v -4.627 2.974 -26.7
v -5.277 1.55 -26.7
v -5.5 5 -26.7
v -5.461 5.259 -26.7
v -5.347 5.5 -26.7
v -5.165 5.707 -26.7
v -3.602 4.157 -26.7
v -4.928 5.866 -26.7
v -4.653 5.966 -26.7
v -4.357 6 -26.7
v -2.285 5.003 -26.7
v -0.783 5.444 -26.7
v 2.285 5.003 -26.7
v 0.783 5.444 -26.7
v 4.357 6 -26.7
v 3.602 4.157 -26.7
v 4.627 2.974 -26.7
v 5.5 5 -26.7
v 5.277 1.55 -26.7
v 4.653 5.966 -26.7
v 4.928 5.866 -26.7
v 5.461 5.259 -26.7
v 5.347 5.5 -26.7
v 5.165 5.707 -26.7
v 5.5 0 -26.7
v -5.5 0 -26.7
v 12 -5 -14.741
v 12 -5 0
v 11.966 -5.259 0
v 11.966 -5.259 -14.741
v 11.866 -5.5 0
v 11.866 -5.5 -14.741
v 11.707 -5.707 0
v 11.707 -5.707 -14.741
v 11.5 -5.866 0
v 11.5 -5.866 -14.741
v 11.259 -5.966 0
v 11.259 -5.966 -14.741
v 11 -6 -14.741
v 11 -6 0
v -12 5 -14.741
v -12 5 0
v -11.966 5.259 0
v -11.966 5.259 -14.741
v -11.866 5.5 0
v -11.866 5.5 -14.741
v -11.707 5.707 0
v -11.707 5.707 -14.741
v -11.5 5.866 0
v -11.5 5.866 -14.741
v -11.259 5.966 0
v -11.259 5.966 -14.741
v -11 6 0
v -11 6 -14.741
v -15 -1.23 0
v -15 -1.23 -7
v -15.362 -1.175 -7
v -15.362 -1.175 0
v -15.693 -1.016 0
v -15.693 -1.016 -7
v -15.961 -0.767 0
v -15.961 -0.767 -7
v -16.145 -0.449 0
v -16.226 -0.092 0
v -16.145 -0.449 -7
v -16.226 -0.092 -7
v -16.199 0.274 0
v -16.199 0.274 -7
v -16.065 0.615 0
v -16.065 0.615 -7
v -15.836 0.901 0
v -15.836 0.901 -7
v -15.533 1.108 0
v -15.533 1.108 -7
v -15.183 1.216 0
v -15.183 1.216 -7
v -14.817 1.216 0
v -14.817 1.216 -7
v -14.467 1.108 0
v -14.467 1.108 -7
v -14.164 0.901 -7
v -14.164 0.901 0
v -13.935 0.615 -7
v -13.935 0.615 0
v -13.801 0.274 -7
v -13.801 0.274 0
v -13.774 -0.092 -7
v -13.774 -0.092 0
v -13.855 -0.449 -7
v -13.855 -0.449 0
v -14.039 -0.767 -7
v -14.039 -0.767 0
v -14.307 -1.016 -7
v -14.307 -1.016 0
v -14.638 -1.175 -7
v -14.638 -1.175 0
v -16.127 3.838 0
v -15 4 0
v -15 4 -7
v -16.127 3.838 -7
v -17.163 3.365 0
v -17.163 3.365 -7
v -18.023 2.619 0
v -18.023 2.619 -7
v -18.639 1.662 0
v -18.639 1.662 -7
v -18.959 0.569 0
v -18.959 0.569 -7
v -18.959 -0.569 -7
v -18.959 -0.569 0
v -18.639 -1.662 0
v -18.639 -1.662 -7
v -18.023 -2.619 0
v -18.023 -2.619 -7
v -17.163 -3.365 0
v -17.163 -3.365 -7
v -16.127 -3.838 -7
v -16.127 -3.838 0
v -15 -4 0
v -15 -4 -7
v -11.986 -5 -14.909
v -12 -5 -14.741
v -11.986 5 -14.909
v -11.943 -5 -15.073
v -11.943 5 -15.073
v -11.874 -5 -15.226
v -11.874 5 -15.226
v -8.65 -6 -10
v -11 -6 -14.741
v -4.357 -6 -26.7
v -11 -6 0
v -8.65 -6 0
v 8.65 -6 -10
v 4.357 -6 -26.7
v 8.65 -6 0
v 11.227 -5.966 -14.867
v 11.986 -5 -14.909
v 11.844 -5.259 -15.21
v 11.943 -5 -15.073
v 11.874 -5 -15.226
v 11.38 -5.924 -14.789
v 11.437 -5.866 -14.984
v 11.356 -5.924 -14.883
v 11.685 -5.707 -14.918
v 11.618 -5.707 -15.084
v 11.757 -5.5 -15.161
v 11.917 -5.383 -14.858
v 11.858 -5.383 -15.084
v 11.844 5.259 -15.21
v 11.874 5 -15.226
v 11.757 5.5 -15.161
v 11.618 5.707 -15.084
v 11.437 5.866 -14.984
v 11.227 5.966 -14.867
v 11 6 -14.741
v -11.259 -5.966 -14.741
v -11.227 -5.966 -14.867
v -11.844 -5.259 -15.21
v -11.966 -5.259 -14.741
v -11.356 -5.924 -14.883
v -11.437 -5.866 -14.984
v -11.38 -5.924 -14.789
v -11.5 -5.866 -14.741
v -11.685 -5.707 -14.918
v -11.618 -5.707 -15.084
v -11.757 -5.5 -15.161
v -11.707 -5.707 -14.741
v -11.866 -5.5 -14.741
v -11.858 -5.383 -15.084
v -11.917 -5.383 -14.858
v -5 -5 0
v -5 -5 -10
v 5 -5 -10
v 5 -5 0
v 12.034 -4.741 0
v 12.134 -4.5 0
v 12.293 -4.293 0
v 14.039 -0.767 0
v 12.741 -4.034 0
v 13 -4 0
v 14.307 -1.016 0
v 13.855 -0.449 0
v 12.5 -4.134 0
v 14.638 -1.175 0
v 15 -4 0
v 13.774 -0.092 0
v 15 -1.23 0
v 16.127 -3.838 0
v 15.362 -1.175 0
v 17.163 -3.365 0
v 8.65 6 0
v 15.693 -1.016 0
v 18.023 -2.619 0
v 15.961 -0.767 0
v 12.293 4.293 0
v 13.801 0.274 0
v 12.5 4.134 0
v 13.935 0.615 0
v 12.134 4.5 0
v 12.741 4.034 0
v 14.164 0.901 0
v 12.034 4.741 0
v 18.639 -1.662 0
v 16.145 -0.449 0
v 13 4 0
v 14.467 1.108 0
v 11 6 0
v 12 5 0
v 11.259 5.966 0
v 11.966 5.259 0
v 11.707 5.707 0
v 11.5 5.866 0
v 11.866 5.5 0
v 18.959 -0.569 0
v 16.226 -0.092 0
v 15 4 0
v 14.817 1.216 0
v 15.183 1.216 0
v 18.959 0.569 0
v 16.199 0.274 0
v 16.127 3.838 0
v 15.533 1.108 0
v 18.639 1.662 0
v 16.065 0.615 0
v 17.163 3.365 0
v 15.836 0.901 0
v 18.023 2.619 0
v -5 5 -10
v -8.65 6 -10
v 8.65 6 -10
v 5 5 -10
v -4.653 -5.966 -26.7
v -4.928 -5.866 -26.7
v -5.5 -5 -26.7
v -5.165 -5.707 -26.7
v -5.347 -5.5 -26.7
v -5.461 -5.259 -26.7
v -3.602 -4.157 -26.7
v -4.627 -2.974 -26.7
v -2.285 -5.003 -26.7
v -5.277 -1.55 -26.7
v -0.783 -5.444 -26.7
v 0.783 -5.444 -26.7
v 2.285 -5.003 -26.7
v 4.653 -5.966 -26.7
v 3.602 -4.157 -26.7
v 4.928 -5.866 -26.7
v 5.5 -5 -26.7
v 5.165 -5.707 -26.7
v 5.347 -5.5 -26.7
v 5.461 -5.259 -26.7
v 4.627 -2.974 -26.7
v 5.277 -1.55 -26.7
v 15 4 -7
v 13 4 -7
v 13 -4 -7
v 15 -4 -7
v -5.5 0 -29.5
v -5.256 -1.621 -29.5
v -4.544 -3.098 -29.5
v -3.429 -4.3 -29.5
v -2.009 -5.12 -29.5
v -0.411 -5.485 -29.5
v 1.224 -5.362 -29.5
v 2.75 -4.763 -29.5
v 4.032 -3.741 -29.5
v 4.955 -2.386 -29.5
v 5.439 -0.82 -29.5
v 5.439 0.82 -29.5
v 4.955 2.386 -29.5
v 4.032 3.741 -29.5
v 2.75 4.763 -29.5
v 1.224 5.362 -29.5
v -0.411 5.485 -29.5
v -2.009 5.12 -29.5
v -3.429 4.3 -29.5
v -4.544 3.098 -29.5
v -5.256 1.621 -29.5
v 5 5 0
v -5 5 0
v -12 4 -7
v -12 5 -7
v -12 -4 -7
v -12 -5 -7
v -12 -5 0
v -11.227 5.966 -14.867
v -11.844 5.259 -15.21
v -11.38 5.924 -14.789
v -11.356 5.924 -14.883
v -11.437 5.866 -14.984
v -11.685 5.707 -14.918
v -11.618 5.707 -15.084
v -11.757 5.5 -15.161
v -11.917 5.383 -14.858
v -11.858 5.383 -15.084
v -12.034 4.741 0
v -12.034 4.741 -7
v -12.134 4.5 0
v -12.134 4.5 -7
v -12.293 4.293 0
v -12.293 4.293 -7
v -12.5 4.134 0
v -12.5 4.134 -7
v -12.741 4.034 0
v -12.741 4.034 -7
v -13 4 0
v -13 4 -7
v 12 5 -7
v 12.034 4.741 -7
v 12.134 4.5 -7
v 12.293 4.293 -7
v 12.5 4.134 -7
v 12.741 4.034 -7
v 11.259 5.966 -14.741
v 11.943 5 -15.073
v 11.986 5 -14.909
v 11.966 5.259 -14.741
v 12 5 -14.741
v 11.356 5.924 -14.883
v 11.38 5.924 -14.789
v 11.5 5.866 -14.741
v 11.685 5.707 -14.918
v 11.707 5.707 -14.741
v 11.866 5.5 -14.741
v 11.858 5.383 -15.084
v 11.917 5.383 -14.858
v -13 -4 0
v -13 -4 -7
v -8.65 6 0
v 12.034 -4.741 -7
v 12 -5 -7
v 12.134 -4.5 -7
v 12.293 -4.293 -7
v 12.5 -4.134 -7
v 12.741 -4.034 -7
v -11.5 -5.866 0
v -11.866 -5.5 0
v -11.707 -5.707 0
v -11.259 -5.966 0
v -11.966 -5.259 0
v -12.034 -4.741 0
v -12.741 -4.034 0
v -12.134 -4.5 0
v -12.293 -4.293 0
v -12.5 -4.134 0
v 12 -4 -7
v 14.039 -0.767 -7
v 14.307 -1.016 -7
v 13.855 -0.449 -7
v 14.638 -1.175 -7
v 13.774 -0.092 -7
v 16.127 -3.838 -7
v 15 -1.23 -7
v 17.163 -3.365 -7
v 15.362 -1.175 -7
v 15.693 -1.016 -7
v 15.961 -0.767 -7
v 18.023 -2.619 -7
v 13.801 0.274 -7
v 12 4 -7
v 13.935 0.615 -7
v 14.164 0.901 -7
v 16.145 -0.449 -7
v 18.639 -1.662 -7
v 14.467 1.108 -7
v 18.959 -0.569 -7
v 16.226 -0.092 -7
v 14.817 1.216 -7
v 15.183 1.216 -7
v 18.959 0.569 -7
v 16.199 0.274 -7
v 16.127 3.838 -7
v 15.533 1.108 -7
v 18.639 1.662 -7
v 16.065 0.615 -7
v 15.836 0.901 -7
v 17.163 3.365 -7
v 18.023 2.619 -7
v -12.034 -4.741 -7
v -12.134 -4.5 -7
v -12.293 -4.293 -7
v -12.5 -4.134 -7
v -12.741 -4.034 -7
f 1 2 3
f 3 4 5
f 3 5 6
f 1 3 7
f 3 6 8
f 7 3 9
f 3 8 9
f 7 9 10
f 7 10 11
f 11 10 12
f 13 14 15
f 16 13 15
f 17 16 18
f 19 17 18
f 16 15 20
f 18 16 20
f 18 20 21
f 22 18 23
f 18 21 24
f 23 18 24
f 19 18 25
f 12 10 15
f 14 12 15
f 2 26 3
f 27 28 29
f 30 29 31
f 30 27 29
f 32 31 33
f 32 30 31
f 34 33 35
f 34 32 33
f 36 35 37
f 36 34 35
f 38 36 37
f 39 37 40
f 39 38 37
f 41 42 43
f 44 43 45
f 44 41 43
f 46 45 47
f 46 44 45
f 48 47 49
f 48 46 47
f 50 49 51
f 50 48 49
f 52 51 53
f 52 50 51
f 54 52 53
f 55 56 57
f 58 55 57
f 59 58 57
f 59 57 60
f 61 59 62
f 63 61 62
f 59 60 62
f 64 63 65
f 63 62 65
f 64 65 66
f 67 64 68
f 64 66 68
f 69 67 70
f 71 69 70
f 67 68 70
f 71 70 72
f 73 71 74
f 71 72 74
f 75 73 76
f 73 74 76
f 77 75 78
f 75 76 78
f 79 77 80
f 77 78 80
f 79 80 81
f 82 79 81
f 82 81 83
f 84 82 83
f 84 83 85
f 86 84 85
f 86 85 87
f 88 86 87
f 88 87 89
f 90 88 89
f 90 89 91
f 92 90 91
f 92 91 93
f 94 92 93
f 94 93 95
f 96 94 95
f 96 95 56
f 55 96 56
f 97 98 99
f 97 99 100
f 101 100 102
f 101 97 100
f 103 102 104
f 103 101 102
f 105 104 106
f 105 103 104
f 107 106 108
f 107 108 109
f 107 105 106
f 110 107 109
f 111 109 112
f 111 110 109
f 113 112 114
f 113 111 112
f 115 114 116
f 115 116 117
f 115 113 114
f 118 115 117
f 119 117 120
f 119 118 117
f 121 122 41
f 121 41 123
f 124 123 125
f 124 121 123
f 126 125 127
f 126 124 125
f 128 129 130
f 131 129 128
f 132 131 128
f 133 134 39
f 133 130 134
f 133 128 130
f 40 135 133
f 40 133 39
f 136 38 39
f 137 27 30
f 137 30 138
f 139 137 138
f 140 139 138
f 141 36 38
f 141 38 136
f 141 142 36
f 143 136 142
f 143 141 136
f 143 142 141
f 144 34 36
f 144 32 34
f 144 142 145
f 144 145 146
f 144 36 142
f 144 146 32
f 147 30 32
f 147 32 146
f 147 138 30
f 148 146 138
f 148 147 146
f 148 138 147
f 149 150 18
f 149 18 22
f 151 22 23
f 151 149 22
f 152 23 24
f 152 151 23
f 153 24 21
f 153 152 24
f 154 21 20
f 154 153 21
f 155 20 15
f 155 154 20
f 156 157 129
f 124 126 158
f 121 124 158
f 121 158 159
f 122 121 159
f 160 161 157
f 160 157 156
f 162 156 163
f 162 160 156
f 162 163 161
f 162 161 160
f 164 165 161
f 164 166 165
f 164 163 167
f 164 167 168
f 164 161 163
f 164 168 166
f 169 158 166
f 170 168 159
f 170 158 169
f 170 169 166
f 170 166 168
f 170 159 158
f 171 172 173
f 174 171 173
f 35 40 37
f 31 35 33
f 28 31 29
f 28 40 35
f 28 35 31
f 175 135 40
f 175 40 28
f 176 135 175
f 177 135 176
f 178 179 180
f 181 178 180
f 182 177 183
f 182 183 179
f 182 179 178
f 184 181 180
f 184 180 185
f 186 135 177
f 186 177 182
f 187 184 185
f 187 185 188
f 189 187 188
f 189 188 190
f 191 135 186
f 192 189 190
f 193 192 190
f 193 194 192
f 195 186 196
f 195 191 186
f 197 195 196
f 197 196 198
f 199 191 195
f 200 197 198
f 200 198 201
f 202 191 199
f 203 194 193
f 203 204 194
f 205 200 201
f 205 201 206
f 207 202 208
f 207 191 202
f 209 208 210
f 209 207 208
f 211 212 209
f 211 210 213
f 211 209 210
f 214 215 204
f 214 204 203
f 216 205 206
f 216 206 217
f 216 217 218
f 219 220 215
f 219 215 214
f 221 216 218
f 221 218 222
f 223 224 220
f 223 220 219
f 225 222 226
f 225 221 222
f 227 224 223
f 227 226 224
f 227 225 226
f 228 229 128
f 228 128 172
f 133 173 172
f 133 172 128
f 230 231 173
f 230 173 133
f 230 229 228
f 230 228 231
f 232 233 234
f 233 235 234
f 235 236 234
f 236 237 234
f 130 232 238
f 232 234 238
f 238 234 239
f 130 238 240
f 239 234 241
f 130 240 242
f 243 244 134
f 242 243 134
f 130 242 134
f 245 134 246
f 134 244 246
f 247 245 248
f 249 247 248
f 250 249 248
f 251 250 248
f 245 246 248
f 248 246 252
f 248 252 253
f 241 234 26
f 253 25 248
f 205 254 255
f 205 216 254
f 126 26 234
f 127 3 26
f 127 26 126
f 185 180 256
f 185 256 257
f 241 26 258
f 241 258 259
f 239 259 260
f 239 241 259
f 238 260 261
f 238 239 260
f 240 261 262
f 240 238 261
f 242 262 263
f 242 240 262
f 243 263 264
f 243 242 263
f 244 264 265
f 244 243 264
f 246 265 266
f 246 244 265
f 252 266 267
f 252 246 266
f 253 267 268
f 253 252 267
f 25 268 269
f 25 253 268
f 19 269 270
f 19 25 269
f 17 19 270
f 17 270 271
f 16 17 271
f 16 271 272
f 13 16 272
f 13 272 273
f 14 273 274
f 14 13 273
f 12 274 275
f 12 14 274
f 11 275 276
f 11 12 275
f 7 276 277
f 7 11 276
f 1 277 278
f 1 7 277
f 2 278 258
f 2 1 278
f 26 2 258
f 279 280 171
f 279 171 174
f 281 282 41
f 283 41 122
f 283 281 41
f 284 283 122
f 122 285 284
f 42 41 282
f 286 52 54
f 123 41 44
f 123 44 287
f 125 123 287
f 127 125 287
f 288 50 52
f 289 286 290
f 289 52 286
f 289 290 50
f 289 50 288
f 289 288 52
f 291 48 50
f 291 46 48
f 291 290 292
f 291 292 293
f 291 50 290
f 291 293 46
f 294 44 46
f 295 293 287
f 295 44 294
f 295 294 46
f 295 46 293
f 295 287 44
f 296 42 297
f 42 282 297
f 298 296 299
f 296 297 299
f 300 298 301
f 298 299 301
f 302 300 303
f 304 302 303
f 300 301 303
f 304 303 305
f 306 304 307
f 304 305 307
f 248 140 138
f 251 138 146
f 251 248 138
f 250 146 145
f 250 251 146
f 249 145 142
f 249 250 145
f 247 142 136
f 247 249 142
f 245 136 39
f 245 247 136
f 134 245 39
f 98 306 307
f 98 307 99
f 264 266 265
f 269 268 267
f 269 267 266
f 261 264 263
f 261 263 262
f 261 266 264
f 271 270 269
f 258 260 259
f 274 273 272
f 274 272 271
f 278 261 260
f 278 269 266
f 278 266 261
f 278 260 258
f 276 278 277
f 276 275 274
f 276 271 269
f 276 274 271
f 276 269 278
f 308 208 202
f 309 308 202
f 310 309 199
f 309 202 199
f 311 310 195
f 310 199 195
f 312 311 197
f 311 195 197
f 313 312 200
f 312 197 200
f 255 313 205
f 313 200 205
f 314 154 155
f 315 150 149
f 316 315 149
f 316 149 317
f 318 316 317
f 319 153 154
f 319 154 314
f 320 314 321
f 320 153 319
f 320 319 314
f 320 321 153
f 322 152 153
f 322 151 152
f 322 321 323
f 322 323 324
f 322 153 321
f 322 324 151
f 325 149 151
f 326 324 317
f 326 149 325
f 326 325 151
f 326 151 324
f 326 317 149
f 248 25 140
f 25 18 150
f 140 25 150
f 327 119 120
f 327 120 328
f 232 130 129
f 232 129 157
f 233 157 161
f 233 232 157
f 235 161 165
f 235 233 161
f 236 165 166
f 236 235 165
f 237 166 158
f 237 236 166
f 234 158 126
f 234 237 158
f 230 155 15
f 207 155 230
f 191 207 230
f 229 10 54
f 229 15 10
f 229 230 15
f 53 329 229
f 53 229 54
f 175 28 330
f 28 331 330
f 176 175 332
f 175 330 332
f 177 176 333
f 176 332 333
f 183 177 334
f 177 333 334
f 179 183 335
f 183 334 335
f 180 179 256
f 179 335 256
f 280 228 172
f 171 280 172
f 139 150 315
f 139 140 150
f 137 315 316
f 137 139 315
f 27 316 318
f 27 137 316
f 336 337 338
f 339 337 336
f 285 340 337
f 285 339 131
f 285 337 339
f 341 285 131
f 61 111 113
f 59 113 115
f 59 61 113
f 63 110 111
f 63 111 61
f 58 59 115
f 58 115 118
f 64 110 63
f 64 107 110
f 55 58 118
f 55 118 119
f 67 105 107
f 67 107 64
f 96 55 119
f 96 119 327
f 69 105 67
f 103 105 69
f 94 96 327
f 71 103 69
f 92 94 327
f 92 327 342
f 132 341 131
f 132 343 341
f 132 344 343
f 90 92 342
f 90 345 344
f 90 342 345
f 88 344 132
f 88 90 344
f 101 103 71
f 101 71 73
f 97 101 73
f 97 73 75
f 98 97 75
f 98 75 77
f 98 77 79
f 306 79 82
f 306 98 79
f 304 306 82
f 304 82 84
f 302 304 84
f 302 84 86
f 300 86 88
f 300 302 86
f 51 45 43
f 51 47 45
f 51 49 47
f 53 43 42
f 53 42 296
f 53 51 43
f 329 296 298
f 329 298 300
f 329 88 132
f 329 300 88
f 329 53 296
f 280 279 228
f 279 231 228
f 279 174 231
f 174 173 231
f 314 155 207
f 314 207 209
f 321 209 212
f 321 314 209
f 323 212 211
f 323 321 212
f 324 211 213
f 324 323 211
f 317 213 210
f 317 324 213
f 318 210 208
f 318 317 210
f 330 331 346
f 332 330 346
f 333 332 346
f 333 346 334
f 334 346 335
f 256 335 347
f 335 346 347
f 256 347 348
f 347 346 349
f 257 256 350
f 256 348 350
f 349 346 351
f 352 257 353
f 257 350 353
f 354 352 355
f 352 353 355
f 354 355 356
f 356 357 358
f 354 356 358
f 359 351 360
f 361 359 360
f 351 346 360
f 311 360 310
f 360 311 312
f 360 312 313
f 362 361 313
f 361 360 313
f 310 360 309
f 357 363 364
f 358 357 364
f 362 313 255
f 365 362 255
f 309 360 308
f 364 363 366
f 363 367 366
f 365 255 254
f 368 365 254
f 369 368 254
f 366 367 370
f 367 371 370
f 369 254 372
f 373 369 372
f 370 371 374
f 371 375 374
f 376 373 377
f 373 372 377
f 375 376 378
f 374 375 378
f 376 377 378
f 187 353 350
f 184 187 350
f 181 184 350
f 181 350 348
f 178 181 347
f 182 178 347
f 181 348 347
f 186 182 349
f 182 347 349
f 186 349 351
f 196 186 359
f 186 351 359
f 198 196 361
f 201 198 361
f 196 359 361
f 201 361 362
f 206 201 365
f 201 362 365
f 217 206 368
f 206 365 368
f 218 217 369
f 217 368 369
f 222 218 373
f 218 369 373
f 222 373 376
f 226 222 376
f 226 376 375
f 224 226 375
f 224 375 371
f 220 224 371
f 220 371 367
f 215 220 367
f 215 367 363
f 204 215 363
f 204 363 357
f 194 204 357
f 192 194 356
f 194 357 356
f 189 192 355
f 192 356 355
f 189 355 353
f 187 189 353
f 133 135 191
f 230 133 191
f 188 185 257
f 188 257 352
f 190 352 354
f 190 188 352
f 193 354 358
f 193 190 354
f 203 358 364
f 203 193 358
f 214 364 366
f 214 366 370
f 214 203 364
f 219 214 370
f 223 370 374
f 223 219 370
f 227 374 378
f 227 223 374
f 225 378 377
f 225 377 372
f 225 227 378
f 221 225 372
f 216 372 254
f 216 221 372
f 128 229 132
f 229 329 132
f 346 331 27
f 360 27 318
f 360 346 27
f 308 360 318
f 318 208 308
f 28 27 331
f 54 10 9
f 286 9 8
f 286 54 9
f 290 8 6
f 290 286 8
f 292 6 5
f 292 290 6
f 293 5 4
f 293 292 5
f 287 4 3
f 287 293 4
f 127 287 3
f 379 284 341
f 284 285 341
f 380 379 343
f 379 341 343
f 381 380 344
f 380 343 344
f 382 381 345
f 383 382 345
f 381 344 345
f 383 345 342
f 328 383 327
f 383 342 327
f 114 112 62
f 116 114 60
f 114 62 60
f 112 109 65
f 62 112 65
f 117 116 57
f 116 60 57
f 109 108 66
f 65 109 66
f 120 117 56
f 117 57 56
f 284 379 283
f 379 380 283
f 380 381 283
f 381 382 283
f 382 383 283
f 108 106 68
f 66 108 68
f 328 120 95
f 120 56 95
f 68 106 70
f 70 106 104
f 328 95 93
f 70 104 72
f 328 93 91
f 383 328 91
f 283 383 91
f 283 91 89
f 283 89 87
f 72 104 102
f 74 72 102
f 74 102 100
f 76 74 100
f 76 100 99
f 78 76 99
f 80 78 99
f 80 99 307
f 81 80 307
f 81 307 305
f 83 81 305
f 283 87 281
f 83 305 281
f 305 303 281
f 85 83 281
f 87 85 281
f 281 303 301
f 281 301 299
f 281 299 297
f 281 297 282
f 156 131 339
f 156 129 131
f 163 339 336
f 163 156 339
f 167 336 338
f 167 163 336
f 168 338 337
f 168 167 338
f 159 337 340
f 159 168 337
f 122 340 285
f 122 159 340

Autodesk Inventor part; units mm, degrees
ref_plane "YZ Plane" through (0, 0, 0) normal (1, 0, 0) x (0, 1, 0)
ref_plane "XZ Plane" through (0, 0, 0) normal (0, 1, 0) x (-1, 0, 0)
ref_plane "XY Plane" through (0, 0, 0) normal (0, 0, 1) x (1, 0, 0)
sketch "スケッチ1" plane through (0, 0, 0) normal (0, 0, 1) x (1, 0, 0)
  line L0 (-12, -6) -> (12, -6)
  line L1 (12, -6) -> (12, 6)
  line L2 (12, 6) -> (-12, 6)
  line L3 (-12, 6) -> (-12, -6)
  line L4 (-12, -6) -> (12, 6) construction
  line L5 (12, -6) -> (-12, 6) construction
  point P0 (0, 0)
  dimension "d0" = 24
  dimension "d1" = 12
extrude "押し出し1" add sketch "スケッチ1" against normal blind 26.7
sketch "スケッチ2" plane through (0, 0, 0) normal (0, 0, 1) x (1, 0, 0)
  line L0 (-15, 0) -> (15, 0) construction
  line L1 (-15, -4) -> (15, -4)
  line L2 (15, 4) -> (-15, 4)
  arc A0 (-15, 4) -> (-15, -4) centre (-15, 0) ccw
  arc A1 (15, -4) -> (15, 4) centre (15, 0) ccw
  point P0 (0, 0)
  dimension "d4" = 30
  dimension "d5" = 4
extrude "押し出し2" add sketch "スケッチ2" against normal blind 7
sketch "スケッチ3" plane through (0, 0, 0) normal (0, 0, 1) x (1, 0, 0)
  arc A0 (-15, 4) -> (-15, -4) centre (-15, 0) ccw projected
  arc A1 (15, -4) -> (15, 4) centre (15, 0) ccw projected
  point P0 (0, 0)
hole "穴1" at (15, 0, 0) at (-15, 0, 0) direction (0, 0, -1) diameter 2.459 end through all thread size "M3x0.5" class "6H" standard "ANSI Metric M Profile"
sketch "スケッチ4" plane through (0, 0, -26.7) normal (0, 0, -1) x (-1, 0, 0)
  circle A0 centre (0, 0) radius 5.5
  line L0 (12, 6) -> (-12, 6) projected
  dimension "d30" = 11
extrude "押し出し3" add sketch "スケッチ4" along normal blind 2.8
sketch "スケッチ5" plane through (-12, 6, 0) normal (0, 1, 0) x (1, 0, 0)
  line L0 (17.5, 29.5) -> (6.5, 29.5) projected
  line L1 (6.5, 26.7) -> (17.5, 26.7) projected
  line L2 (6.5, 26.7) -> (17.5, 26.7) projected
  line L3 (6.5, 26.7) -> (6.5, 26.7) projected
  line L4 (17.5, 26.7) -> (24, 15)
  line L5 (24, 0) -> (24, 26.7) projected
  line L6 (24, 0) -> (0, 0) projected
  line L7 (6.5, 26.7) -> (0, 15)
  line L8 (0, 0) -> (0, 26.7) projected
  line L9 (24, 0) -> (0, 0) projected
  line L10 (24, 0) -> (24, 26.7) projected
  line L11 (0, 26.7) -> (24, 26.7) projected
  line L12 (0, 0) -> (0, 26.7) projected
  point P0 (12, 0)
  point P1 (17.5, 26.7)
  point P2 (6.5, 26.7)
  dimension "d18" = 15
  dimension "d19" = 15
extrude "押し出し4" cut sketch "スケッチ5" against normal through all contours L7 L8 L11 | L11 L5 L4
sketch "スケッチ6" plane through (0, 0, 0) normal (0, 0, 1) x (1, 0, 0)
  line L0 (-8.65, -6) -> (8.65, -6)
  line L1 (8.65, -6) -> (8.65, 6)
  line L2 (8.65, 6) -> (-8.65, 6)
  line L3 (-8.65, 6) -> (-8.65, -6)
  line L4 (-8.65, -6) -> (8.65, 6) construction
  line L5 (8.65, -6) -> (-8.65, 6) construction
  line L6 (12, 6) -> (-12, 6) projected
  point P0 (0, 0)
  dimension "d22" = 17.3
extrude "押し出し5" cut sketch "スケッチ6" against normal blind 10
sketch "スケッチ7" plane through (0, 0, -10) normal (0, 0, 1) x (1, 0, 0)
  line L0 (-5, -5) -> (5, -5)
  line L1 (5, -5) -> (5, 5)
  line L2 (5, 5) -> (-5, 5)
  line L3 (-5, 5) -> (-5, -5)
  line L4 (-5, -5) -> (5, 5) construction
  line L5 (5, -5) -> (-5, 5) construction
  point P0 (0, 0)
  dimension "d25" = 10
  dimension "d26" = 10
extrude "押し出し6" add sketch "スケッチ7" along normal blind 10
fillet "フィレット1" radius 1 14 edges at (12, 4, -3.5) (12, -4, -3.5) (-12, -4, -3.5) (-12, -6, -7.5) (12, -6, -7.5) (12, 6, -7.5) (-12, 4, -3.5) (-12, 6, -7.5) (-8.75, 6, -20.85) (-12, 0, -15) (-8.75, -6, -20.85) (8.75, -6, -20.85) (12, 0, -15) (8.75, 6, -20.85)
properties part number "USB2-MBMPAF-XXE" material "ABS プラスチック"
